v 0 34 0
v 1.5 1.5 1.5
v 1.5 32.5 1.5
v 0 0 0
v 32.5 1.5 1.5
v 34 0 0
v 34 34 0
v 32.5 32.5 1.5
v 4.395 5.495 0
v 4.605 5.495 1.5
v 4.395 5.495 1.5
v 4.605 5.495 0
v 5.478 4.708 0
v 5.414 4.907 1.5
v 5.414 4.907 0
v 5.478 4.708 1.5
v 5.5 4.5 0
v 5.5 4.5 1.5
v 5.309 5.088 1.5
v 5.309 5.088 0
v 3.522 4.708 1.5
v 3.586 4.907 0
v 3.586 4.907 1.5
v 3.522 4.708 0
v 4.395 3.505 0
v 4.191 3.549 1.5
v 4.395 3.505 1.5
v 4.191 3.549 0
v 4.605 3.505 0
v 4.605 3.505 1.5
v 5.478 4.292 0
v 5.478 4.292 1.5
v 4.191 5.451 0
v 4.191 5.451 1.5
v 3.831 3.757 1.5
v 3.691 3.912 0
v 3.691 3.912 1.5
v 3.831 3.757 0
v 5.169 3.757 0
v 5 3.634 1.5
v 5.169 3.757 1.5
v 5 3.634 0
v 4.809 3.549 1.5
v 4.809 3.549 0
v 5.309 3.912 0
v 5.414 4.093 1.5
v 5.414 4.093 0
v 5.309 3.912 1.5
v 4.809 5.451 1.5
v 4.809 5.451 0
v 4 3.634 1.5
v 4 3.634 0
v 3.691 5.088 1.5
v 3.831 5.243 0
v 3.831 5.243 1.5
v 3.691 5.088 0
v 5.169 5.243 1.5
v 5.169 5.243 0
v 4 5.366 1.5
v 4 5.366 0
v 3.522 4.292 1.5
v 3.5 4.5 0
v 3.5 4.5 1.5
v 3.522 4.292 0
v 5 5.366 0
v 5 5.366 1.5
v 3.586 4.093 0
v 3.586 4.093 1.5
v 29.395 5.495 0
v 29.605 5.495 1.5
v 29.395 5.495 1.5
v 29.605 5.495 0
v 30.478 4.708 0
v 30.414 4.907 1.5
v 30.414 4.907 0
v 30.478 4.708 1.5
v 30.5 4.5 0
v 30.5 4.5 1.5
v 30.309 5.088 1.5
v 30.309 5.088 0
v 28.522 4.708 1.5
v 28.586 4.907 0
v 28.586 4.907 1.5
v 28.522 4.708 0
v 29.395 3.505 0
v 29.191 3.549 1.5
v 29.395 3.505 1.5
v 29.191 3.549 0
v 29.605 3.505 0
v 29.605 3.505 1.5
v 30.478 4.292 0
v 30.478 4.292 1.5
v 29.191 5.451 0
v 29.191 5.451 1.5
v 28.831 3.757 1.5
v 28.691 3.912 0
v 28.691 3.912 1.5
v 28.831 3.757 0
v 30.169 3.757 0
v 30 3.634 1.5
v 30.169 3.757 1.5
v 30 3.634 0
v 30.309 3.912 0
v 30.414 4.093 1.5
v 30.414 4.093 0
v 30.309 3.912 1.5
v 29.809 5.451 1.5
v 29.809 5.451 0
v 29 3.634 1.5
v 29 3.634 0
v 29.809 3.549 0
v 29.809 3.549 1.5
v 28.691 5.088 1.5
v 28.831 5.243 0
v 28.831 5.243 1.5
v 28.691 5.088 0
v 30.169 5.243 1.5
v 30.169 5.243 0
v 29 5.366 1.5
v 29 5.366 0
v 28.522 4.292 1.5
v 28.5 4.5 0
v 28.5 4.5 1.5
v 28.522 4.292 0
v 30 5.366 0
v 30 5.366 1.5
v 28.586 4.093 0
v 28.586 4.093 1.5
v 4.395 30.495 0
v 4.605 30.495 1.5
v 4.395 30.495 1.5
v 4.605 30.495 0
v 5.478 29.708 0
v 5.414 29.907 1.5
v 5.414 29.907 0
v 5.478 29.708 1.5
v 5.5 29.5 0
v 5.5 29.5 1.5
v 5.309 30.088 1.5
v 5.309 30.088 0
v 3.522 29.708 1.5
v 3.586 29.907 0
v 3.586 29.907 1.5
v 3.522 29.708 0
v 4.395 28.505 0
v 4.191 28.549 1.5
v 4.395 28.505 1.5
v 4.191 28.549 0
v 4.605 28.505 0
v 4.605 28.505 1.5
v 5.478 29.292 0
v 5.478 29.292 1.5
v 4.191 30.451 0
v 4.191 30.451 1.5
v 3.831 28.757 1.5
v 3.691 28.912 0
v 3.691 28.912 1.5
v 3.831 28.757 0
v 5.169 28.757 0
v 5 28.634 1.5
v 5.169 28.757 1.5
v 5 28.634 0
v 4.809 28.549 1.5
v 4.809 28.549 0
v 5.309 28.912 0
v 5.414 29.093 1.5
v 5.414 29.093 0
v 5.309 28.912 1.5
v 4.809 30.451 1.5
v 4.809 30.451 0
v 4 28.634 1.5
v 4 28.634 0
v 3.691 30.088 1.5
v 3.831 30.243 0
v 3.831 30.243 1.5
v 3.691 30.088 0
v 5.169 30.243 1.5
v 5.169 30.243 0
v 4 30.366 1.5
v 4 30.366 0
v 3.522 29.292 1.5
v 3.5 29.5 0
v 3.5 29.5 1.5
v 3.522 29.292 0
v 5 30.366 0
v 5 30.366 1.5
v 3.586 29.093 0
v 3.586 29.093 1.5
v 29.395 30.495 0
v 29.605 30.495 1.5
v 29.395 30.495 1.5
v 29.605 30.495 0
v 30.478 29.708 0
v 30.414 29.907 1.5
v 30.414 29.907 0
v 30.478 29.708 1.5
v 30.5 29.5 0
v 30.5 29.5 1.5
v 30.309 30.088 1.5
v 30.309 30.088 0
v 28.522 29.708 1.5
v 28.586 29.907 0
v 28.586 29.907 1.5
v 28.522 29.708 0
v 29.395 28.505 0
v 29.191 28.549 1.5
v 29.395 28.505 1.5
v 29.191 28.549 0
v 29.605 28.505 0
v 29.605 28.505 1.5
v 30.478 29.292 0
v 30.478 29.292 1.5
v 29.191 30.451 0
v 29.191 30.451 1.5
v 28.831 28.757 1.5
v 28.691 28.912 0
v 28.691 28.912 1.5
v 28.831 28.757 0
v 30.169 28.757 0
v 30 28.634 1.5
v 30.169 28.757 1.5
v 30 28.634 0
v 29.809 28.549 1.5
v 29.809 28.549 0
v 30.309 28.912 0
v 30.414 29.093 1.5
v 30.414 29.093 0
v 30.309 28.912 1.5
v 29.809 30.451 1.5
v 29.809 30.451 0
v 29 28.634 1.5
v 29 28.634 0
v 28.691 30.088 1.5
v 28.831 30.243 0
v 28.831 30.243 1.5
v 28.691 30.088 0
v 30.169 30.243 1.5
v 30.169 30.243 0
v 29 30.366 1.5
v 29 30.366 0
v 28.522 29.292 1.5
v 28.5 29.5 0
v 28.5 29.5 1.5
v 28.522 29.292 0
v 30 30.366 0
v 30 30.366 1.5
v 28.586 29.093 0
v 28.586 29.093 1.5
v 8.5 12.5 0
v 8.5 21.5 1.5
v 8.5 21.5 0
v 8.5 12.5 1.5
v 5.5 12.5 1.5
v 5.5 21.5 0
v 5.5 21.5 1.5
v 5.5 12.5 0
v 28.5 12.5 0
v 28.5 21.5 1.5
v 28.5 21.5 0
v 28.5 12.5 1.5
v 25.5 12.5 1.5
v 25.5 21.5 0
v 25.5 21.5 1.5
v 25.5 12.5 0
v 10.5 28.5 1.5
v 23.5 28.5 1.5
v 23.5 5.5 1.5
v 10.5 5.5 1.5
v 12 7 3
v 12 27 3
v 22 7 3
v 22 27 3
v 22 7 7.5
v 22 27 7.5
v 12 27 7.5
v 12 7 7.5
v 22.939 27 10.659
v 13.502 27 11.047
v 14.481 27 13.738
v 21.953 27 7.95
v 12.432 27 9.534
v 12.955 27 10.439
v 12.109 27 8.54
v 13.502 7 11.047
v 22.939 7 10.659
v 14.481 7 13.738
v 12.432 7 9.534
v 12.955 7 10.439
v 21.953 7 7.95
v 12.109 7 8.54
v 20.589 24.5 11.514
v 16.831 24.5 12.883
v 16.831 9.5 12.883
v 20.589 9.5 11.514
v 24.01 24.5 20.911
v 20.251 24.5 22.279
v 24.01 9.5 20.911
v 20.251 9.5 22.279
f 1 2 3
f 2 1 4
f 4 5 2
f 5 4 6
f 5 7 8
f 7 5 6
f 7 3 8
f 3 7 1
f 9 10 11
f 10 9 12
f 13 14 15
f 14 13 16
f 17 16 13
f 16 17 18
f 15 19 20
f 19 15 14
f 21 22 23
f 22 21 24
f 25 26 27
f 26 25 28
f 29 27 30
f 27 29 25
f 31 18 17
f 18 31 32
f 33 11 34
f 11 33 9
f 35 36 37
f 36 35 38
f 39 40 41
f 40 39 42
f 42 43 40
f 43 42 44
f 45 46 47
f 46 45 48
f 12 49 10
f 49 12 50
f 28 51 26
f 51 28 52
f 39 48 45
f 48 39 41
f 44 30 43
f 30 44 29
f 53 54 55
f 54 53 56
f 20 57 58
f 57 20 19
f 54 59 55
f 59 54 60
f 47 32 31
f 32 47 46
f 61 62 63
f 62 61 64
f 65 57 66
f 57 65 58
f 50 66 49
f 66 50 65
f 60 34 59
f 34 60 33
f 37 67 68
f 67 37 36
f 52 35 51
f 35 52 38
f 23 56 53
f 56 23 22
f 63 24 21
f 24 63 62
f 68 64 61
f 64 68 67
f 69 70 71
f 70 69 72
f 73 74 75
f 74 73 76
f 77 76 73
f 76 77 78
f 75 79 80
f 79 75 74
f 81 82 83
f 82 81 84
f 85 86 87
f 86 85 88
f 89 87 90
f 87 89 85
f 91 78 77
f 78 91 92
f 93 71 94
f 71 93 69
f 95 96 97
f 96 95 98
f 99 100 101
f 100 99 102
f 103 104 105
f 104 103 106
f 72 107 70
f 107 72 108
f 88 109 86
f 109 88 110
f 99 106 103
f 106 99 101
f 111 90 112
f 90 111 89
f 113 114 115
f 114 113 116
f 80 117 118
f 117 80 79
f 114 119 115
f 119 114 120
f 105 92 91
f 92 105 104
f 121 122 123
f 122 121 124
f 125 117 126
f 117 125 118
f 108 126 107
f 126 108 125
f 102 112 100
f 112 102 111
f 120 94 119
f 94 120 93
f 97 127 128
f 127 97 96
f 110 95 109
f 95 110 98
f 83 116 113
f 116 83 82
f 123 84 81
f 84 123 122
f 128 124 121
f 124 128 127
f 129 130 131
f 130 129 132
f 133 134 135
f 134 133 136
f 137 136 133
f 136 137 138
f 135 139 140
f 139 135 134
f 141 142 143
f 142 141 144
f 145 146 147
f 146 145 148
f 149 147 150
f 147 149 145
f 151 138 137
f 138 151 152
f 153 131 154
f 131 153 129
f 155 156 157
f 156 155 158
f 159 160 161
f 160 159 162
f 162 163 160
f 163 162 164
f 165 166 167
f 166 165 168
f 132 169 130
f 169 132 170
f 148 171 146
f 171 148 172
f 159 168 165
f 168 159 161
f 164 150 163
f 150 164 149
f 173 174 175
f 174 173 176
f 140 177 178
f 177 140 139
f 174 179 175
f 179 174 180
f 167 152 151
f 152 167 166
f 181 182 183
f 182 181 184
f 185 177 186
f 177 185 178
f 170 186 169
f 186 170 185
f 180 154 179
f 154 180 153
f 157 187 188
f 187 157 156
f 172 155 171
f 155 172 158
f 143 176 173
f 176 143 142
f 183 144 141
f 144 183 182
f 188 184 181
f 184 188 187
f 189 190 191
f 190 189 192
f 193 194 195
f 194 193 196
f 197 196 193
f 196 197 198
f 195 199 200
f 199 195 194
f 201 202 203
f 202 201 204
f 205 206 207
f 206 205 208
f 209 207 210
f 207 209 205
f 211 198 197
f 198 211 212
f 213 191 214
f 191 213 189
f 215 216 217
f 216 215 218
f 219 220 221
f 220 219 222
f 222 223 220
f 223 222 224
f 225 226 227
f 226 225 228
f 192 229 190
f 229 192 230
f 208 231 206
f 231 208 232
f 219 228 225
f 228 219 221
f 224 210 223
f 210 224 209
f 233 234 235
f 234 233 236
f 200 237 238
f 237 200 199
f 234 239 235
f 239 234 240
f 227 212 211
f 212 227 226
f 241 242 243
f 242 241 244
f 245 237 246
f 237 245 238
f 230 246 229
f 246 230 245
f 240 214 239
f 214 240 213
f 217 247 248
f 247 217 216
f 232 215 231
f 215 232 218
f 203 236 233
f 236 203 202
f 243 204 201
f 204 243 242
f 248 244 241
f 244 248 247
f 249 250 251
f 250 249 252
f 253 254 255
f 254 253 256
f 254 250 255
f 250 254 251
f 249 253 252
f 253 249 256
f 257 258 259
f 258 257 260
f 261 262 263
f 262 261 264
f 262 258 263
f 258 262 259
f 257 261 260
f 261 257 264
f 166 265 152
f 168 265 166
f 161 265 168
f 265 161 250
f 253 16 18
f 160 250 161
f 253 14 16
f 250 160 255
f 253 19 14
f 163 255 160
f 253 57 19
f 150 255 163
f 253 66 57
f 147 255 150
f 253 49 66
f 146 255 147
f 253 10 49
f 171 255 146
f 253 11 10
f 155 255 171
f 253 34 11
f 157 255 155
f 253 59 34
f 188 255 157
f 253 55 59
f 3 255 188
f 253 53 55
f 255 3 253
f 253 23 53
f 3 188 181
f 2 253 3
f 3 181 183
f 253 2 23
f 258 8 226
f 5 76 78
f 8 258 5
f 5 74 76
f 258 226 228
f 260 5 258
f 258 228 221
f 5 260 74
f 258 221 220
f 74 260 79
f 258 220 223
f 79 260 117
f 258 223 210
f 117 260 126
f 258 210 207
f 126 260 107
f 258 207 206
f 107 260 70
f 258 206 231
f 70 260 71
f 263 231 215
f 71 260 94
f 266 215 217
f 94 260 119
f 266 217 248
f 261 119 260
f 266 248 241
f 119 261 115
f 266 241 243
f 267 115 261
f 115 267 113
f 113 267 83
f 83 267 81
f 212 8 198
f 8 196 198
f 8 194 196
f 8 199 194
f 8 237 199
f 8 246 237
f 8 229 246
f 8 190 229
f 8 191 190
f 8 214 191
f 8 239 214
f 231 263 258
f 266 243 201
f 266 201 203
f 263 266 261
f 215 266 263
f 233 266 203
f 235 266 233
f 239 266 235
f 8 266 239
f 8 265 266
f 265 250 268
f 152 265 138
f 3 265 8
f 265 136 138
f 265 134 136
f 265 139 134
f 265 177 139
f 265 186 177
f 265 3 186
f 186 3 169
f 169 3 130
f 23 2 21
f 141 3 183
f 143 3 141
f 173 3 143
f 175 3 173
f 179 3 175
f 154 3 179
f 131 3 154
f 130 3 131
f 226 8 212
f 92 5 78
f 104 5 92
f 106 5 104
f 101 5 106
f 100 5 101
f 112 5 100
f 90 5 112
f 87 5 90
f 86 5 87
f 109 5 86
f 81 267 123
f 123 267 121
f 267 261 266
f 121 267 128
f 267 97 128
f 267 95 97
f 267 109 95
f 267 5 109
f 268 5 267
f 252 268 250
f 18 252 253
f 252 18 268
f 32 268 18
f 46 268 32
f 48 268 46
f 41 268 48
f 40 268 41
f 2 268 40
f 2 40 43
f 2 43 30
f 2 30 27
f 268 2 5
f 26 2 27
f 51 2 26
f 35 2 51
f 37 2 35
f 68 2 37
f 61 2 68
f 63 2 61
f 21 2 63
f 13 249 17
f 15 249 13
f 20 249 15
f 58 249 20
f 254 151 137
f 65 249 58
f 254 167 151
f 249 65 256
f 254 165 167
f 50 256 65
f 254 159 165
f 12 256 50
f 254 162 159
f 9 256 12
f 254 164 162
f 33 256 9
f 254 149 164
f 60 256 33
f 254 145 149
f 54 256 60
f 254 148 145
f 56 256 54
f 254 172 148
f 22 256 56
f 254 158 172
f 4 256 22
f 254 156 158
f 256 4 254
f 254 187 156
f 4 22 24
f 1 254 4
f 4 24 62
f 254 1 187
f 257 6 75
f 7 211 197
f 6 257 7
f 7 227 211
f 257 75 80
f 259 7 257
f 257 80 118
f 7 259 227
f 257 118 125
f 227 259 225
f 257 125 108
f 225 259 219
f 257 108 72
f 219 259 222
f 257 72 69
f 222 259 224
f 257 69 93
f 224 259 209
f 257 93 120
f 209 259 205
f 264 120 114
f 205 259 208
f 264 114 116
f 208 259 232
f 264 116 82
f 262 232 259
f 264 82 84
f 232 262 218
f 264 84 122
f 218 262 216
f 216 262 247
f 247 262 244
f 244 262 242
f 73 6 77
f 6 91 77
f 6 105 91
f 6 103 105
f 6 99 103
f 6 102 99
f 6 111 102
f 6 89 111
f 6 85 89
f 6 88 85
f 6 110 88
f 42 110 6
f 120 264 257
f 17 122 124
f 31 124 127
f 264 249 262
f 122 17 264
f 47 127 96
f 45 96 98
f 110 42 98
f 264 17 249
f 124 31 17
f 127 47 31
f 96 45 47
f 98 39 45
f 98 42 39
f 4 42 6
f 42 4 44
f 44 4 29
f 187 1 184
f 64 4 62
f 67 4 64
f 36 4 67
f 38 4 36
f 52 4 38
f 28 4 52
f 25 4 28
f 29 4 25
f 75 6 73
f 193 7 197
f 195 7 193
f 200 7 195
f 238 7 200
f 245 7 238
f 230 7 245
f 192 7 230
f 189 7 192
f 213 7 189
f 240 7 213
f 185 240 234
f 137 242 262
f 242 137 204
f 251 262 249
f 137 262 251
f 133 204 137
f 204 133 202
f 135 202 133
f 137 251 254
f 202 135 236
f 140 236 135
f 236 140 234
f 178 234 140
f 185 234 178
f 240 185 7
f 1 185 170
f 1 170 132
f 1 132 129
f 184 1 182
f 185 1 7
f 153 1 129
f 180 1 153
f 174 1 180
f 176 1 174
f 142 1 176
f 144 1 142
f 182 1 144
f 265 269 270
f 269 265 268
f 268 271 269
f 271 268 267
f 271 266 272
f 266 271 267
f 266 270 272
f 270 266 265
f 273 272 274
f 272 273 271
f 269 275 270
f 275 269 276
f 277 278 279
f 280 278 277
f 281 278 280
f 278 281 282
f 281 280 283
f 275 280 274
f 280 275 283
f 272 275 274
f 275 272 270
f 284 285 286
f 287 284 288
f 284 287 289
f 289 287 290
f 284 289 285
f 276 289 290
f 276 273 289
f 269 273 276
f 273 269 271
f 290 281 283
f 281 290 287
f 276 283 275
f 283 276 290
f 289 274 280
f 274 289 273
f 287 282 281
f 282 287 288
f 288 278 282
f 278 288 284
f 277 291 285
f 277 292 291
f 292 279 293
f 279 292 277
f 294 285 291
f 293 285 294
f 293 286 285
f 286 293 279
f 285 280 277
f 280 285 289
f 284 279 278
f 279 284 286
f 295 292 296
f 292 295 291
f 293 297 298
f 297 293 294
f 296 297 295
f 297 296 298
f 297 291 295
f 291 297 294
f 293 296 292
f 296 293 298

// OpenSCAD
// title      : RoboGen parametric B part
// author     : Alice Concordel

partB(20); //the parameter is the angle of the parametric part

module partB(alpha)
{
//plate parameters
	lengthSlide = 34;
	widthSlide = 34;
	heightSlide = 1.5;
	
	radiusHole = 1;

//wire hole parameters
	lengthWire = 3;
	widthWire = 9;
	heightWire = heightSlide;

//joint base parameters
	lengthBase = 10;
	widthBase = 20;
	heightBase = 6;
	
//cylinder parameters
	radiusCylinderBase = 5;
	heightCylinderBase = 20;
	
//rotating cube top part parameters
	lengthTop = 9;
	widthTop = 20;
	heightTop = 5;
	
	lengthEnd = 4;
	widthEnd = 15;
	heightEnd = 10;
	
	
	union()
	{
		difference()
		{
			// starting plate
			cube([lengthSlide,widthSlide,1.5]);
			
			union()
			{
			// chamfer the edges of the plate
				rotate ([0,-45,0]) cube([3,widthSlide,3]);
				rotate([45,0,0]) cube([lengthSlide,3,3]);
				translate([lengthSlide,0,0]) rotate([0,-45,0]) cube([3,widthSlide,3]);
				translate([0,widthSlide,0]) rotate([45,0,0]) cube([lengthSlide,3,3]);

			// holes in the plate
					//round holes
				translate([4.5,4.5,-0.5]) cylinder(r = radiusHole, h = heightSlide+1, $fn = 30);
				translate([lengthSlide-4.5,4.5,-0.5]) cylinder(r = radiusHole, h = heightSlide+1, $fn = 30);
				translate([4.5,widthSlide-4.5,-0.5]) cylinder(r = radiusHole, h = heightSlide+1, $fn = 30);
				translate([lengthSlide-4.5,widthSlide-4.5,-0.5]) cylinder(r = radiusHole, h = heightSlide+1, $fn = 30);
				
					//rectangular wire holes
				translate([7-lengthWire/2,widthSlide/2-widthWire/2,-0.5]) cube([lengthWire,widthWire,heightWire+1]);
				translate([lengthSlide-7-lengthWire/2,widthSlide/2-widthWire/2,-0.5]) cube([lengthWire,widthWire,heightWire+1]);
			}
		}
		// base of shaft part
		translate([lengthSlide/2-10/2,widthSlide/2-20/2,0]) cube([lengthBase,widthBase,heightBase+heightSlide]);
	
		//chamfer the edges of the shaft base
		difference()
		{
			translate([lengthSlide/2-(lengthBase+3)/2,widthSlide/2-(widthBase+3)/2]) cube([lengthBase+3,widthBase+3,3]);
			union()
			{
			translate([lengthSlide/2-lengthBase/2-heightSlide,0,heightSlide]) rotate ([0,-45,0]) cube([heightSlide*sqrt(2),34,heightSlide*sqrt(2)]);
			translate([0,widthSlide/2-widthBase/2-heightSlide,heightSlide]) rotate([45,0,0]) cube([lengthSlide,heightSlide*sqrt(2),heightSlide*sqrt(2)]);
			translate([lengthSlide/2+lengthBase/2+heightSlide,0,heightSlide]) rotate([0,-45,0]) cube([heightSlide*sqrt(2),34,heightSlide*sqrt(2)]);
			translate([0,widthSlide/2+widthBase/2+heightSlide,heightSlide]) rotate([45,0,0]) cube([lengthSlide,heightSlide*sqrt(2),heightSlide*sqrt(2)]);
			}
		}

		// cylinder or rounded part
		translate([lengthSlide/2,widthSlide/2-heightCylinderBase/2,heightBase+heightSlide]) rotate([-90,0,0]) cylinder(r = radiusCylinderBase, h = heightCylinderBase, $fn = 30);
		
		// next part of join = Box over one smaller Box
		//========================== angle parameter below
		translate([lengthSlide/2,widthSlide/2-widthTop/2,heightSlide+heightBase]) rotate([0,alpha,0]) translate([-lengthTop/2,0,0]) cube([lengthTop,widthTop,heightTop]);
		translate([lengthSlide/2,widthSlide/2-widthEnd/2,heightSlide+heightBase]) rotate([0,alpha,0]) translate([-lengthEnd/2,0,0]) cube([lengthEnd,widthEnd,heightEnd+heightTop]);
	}
}
